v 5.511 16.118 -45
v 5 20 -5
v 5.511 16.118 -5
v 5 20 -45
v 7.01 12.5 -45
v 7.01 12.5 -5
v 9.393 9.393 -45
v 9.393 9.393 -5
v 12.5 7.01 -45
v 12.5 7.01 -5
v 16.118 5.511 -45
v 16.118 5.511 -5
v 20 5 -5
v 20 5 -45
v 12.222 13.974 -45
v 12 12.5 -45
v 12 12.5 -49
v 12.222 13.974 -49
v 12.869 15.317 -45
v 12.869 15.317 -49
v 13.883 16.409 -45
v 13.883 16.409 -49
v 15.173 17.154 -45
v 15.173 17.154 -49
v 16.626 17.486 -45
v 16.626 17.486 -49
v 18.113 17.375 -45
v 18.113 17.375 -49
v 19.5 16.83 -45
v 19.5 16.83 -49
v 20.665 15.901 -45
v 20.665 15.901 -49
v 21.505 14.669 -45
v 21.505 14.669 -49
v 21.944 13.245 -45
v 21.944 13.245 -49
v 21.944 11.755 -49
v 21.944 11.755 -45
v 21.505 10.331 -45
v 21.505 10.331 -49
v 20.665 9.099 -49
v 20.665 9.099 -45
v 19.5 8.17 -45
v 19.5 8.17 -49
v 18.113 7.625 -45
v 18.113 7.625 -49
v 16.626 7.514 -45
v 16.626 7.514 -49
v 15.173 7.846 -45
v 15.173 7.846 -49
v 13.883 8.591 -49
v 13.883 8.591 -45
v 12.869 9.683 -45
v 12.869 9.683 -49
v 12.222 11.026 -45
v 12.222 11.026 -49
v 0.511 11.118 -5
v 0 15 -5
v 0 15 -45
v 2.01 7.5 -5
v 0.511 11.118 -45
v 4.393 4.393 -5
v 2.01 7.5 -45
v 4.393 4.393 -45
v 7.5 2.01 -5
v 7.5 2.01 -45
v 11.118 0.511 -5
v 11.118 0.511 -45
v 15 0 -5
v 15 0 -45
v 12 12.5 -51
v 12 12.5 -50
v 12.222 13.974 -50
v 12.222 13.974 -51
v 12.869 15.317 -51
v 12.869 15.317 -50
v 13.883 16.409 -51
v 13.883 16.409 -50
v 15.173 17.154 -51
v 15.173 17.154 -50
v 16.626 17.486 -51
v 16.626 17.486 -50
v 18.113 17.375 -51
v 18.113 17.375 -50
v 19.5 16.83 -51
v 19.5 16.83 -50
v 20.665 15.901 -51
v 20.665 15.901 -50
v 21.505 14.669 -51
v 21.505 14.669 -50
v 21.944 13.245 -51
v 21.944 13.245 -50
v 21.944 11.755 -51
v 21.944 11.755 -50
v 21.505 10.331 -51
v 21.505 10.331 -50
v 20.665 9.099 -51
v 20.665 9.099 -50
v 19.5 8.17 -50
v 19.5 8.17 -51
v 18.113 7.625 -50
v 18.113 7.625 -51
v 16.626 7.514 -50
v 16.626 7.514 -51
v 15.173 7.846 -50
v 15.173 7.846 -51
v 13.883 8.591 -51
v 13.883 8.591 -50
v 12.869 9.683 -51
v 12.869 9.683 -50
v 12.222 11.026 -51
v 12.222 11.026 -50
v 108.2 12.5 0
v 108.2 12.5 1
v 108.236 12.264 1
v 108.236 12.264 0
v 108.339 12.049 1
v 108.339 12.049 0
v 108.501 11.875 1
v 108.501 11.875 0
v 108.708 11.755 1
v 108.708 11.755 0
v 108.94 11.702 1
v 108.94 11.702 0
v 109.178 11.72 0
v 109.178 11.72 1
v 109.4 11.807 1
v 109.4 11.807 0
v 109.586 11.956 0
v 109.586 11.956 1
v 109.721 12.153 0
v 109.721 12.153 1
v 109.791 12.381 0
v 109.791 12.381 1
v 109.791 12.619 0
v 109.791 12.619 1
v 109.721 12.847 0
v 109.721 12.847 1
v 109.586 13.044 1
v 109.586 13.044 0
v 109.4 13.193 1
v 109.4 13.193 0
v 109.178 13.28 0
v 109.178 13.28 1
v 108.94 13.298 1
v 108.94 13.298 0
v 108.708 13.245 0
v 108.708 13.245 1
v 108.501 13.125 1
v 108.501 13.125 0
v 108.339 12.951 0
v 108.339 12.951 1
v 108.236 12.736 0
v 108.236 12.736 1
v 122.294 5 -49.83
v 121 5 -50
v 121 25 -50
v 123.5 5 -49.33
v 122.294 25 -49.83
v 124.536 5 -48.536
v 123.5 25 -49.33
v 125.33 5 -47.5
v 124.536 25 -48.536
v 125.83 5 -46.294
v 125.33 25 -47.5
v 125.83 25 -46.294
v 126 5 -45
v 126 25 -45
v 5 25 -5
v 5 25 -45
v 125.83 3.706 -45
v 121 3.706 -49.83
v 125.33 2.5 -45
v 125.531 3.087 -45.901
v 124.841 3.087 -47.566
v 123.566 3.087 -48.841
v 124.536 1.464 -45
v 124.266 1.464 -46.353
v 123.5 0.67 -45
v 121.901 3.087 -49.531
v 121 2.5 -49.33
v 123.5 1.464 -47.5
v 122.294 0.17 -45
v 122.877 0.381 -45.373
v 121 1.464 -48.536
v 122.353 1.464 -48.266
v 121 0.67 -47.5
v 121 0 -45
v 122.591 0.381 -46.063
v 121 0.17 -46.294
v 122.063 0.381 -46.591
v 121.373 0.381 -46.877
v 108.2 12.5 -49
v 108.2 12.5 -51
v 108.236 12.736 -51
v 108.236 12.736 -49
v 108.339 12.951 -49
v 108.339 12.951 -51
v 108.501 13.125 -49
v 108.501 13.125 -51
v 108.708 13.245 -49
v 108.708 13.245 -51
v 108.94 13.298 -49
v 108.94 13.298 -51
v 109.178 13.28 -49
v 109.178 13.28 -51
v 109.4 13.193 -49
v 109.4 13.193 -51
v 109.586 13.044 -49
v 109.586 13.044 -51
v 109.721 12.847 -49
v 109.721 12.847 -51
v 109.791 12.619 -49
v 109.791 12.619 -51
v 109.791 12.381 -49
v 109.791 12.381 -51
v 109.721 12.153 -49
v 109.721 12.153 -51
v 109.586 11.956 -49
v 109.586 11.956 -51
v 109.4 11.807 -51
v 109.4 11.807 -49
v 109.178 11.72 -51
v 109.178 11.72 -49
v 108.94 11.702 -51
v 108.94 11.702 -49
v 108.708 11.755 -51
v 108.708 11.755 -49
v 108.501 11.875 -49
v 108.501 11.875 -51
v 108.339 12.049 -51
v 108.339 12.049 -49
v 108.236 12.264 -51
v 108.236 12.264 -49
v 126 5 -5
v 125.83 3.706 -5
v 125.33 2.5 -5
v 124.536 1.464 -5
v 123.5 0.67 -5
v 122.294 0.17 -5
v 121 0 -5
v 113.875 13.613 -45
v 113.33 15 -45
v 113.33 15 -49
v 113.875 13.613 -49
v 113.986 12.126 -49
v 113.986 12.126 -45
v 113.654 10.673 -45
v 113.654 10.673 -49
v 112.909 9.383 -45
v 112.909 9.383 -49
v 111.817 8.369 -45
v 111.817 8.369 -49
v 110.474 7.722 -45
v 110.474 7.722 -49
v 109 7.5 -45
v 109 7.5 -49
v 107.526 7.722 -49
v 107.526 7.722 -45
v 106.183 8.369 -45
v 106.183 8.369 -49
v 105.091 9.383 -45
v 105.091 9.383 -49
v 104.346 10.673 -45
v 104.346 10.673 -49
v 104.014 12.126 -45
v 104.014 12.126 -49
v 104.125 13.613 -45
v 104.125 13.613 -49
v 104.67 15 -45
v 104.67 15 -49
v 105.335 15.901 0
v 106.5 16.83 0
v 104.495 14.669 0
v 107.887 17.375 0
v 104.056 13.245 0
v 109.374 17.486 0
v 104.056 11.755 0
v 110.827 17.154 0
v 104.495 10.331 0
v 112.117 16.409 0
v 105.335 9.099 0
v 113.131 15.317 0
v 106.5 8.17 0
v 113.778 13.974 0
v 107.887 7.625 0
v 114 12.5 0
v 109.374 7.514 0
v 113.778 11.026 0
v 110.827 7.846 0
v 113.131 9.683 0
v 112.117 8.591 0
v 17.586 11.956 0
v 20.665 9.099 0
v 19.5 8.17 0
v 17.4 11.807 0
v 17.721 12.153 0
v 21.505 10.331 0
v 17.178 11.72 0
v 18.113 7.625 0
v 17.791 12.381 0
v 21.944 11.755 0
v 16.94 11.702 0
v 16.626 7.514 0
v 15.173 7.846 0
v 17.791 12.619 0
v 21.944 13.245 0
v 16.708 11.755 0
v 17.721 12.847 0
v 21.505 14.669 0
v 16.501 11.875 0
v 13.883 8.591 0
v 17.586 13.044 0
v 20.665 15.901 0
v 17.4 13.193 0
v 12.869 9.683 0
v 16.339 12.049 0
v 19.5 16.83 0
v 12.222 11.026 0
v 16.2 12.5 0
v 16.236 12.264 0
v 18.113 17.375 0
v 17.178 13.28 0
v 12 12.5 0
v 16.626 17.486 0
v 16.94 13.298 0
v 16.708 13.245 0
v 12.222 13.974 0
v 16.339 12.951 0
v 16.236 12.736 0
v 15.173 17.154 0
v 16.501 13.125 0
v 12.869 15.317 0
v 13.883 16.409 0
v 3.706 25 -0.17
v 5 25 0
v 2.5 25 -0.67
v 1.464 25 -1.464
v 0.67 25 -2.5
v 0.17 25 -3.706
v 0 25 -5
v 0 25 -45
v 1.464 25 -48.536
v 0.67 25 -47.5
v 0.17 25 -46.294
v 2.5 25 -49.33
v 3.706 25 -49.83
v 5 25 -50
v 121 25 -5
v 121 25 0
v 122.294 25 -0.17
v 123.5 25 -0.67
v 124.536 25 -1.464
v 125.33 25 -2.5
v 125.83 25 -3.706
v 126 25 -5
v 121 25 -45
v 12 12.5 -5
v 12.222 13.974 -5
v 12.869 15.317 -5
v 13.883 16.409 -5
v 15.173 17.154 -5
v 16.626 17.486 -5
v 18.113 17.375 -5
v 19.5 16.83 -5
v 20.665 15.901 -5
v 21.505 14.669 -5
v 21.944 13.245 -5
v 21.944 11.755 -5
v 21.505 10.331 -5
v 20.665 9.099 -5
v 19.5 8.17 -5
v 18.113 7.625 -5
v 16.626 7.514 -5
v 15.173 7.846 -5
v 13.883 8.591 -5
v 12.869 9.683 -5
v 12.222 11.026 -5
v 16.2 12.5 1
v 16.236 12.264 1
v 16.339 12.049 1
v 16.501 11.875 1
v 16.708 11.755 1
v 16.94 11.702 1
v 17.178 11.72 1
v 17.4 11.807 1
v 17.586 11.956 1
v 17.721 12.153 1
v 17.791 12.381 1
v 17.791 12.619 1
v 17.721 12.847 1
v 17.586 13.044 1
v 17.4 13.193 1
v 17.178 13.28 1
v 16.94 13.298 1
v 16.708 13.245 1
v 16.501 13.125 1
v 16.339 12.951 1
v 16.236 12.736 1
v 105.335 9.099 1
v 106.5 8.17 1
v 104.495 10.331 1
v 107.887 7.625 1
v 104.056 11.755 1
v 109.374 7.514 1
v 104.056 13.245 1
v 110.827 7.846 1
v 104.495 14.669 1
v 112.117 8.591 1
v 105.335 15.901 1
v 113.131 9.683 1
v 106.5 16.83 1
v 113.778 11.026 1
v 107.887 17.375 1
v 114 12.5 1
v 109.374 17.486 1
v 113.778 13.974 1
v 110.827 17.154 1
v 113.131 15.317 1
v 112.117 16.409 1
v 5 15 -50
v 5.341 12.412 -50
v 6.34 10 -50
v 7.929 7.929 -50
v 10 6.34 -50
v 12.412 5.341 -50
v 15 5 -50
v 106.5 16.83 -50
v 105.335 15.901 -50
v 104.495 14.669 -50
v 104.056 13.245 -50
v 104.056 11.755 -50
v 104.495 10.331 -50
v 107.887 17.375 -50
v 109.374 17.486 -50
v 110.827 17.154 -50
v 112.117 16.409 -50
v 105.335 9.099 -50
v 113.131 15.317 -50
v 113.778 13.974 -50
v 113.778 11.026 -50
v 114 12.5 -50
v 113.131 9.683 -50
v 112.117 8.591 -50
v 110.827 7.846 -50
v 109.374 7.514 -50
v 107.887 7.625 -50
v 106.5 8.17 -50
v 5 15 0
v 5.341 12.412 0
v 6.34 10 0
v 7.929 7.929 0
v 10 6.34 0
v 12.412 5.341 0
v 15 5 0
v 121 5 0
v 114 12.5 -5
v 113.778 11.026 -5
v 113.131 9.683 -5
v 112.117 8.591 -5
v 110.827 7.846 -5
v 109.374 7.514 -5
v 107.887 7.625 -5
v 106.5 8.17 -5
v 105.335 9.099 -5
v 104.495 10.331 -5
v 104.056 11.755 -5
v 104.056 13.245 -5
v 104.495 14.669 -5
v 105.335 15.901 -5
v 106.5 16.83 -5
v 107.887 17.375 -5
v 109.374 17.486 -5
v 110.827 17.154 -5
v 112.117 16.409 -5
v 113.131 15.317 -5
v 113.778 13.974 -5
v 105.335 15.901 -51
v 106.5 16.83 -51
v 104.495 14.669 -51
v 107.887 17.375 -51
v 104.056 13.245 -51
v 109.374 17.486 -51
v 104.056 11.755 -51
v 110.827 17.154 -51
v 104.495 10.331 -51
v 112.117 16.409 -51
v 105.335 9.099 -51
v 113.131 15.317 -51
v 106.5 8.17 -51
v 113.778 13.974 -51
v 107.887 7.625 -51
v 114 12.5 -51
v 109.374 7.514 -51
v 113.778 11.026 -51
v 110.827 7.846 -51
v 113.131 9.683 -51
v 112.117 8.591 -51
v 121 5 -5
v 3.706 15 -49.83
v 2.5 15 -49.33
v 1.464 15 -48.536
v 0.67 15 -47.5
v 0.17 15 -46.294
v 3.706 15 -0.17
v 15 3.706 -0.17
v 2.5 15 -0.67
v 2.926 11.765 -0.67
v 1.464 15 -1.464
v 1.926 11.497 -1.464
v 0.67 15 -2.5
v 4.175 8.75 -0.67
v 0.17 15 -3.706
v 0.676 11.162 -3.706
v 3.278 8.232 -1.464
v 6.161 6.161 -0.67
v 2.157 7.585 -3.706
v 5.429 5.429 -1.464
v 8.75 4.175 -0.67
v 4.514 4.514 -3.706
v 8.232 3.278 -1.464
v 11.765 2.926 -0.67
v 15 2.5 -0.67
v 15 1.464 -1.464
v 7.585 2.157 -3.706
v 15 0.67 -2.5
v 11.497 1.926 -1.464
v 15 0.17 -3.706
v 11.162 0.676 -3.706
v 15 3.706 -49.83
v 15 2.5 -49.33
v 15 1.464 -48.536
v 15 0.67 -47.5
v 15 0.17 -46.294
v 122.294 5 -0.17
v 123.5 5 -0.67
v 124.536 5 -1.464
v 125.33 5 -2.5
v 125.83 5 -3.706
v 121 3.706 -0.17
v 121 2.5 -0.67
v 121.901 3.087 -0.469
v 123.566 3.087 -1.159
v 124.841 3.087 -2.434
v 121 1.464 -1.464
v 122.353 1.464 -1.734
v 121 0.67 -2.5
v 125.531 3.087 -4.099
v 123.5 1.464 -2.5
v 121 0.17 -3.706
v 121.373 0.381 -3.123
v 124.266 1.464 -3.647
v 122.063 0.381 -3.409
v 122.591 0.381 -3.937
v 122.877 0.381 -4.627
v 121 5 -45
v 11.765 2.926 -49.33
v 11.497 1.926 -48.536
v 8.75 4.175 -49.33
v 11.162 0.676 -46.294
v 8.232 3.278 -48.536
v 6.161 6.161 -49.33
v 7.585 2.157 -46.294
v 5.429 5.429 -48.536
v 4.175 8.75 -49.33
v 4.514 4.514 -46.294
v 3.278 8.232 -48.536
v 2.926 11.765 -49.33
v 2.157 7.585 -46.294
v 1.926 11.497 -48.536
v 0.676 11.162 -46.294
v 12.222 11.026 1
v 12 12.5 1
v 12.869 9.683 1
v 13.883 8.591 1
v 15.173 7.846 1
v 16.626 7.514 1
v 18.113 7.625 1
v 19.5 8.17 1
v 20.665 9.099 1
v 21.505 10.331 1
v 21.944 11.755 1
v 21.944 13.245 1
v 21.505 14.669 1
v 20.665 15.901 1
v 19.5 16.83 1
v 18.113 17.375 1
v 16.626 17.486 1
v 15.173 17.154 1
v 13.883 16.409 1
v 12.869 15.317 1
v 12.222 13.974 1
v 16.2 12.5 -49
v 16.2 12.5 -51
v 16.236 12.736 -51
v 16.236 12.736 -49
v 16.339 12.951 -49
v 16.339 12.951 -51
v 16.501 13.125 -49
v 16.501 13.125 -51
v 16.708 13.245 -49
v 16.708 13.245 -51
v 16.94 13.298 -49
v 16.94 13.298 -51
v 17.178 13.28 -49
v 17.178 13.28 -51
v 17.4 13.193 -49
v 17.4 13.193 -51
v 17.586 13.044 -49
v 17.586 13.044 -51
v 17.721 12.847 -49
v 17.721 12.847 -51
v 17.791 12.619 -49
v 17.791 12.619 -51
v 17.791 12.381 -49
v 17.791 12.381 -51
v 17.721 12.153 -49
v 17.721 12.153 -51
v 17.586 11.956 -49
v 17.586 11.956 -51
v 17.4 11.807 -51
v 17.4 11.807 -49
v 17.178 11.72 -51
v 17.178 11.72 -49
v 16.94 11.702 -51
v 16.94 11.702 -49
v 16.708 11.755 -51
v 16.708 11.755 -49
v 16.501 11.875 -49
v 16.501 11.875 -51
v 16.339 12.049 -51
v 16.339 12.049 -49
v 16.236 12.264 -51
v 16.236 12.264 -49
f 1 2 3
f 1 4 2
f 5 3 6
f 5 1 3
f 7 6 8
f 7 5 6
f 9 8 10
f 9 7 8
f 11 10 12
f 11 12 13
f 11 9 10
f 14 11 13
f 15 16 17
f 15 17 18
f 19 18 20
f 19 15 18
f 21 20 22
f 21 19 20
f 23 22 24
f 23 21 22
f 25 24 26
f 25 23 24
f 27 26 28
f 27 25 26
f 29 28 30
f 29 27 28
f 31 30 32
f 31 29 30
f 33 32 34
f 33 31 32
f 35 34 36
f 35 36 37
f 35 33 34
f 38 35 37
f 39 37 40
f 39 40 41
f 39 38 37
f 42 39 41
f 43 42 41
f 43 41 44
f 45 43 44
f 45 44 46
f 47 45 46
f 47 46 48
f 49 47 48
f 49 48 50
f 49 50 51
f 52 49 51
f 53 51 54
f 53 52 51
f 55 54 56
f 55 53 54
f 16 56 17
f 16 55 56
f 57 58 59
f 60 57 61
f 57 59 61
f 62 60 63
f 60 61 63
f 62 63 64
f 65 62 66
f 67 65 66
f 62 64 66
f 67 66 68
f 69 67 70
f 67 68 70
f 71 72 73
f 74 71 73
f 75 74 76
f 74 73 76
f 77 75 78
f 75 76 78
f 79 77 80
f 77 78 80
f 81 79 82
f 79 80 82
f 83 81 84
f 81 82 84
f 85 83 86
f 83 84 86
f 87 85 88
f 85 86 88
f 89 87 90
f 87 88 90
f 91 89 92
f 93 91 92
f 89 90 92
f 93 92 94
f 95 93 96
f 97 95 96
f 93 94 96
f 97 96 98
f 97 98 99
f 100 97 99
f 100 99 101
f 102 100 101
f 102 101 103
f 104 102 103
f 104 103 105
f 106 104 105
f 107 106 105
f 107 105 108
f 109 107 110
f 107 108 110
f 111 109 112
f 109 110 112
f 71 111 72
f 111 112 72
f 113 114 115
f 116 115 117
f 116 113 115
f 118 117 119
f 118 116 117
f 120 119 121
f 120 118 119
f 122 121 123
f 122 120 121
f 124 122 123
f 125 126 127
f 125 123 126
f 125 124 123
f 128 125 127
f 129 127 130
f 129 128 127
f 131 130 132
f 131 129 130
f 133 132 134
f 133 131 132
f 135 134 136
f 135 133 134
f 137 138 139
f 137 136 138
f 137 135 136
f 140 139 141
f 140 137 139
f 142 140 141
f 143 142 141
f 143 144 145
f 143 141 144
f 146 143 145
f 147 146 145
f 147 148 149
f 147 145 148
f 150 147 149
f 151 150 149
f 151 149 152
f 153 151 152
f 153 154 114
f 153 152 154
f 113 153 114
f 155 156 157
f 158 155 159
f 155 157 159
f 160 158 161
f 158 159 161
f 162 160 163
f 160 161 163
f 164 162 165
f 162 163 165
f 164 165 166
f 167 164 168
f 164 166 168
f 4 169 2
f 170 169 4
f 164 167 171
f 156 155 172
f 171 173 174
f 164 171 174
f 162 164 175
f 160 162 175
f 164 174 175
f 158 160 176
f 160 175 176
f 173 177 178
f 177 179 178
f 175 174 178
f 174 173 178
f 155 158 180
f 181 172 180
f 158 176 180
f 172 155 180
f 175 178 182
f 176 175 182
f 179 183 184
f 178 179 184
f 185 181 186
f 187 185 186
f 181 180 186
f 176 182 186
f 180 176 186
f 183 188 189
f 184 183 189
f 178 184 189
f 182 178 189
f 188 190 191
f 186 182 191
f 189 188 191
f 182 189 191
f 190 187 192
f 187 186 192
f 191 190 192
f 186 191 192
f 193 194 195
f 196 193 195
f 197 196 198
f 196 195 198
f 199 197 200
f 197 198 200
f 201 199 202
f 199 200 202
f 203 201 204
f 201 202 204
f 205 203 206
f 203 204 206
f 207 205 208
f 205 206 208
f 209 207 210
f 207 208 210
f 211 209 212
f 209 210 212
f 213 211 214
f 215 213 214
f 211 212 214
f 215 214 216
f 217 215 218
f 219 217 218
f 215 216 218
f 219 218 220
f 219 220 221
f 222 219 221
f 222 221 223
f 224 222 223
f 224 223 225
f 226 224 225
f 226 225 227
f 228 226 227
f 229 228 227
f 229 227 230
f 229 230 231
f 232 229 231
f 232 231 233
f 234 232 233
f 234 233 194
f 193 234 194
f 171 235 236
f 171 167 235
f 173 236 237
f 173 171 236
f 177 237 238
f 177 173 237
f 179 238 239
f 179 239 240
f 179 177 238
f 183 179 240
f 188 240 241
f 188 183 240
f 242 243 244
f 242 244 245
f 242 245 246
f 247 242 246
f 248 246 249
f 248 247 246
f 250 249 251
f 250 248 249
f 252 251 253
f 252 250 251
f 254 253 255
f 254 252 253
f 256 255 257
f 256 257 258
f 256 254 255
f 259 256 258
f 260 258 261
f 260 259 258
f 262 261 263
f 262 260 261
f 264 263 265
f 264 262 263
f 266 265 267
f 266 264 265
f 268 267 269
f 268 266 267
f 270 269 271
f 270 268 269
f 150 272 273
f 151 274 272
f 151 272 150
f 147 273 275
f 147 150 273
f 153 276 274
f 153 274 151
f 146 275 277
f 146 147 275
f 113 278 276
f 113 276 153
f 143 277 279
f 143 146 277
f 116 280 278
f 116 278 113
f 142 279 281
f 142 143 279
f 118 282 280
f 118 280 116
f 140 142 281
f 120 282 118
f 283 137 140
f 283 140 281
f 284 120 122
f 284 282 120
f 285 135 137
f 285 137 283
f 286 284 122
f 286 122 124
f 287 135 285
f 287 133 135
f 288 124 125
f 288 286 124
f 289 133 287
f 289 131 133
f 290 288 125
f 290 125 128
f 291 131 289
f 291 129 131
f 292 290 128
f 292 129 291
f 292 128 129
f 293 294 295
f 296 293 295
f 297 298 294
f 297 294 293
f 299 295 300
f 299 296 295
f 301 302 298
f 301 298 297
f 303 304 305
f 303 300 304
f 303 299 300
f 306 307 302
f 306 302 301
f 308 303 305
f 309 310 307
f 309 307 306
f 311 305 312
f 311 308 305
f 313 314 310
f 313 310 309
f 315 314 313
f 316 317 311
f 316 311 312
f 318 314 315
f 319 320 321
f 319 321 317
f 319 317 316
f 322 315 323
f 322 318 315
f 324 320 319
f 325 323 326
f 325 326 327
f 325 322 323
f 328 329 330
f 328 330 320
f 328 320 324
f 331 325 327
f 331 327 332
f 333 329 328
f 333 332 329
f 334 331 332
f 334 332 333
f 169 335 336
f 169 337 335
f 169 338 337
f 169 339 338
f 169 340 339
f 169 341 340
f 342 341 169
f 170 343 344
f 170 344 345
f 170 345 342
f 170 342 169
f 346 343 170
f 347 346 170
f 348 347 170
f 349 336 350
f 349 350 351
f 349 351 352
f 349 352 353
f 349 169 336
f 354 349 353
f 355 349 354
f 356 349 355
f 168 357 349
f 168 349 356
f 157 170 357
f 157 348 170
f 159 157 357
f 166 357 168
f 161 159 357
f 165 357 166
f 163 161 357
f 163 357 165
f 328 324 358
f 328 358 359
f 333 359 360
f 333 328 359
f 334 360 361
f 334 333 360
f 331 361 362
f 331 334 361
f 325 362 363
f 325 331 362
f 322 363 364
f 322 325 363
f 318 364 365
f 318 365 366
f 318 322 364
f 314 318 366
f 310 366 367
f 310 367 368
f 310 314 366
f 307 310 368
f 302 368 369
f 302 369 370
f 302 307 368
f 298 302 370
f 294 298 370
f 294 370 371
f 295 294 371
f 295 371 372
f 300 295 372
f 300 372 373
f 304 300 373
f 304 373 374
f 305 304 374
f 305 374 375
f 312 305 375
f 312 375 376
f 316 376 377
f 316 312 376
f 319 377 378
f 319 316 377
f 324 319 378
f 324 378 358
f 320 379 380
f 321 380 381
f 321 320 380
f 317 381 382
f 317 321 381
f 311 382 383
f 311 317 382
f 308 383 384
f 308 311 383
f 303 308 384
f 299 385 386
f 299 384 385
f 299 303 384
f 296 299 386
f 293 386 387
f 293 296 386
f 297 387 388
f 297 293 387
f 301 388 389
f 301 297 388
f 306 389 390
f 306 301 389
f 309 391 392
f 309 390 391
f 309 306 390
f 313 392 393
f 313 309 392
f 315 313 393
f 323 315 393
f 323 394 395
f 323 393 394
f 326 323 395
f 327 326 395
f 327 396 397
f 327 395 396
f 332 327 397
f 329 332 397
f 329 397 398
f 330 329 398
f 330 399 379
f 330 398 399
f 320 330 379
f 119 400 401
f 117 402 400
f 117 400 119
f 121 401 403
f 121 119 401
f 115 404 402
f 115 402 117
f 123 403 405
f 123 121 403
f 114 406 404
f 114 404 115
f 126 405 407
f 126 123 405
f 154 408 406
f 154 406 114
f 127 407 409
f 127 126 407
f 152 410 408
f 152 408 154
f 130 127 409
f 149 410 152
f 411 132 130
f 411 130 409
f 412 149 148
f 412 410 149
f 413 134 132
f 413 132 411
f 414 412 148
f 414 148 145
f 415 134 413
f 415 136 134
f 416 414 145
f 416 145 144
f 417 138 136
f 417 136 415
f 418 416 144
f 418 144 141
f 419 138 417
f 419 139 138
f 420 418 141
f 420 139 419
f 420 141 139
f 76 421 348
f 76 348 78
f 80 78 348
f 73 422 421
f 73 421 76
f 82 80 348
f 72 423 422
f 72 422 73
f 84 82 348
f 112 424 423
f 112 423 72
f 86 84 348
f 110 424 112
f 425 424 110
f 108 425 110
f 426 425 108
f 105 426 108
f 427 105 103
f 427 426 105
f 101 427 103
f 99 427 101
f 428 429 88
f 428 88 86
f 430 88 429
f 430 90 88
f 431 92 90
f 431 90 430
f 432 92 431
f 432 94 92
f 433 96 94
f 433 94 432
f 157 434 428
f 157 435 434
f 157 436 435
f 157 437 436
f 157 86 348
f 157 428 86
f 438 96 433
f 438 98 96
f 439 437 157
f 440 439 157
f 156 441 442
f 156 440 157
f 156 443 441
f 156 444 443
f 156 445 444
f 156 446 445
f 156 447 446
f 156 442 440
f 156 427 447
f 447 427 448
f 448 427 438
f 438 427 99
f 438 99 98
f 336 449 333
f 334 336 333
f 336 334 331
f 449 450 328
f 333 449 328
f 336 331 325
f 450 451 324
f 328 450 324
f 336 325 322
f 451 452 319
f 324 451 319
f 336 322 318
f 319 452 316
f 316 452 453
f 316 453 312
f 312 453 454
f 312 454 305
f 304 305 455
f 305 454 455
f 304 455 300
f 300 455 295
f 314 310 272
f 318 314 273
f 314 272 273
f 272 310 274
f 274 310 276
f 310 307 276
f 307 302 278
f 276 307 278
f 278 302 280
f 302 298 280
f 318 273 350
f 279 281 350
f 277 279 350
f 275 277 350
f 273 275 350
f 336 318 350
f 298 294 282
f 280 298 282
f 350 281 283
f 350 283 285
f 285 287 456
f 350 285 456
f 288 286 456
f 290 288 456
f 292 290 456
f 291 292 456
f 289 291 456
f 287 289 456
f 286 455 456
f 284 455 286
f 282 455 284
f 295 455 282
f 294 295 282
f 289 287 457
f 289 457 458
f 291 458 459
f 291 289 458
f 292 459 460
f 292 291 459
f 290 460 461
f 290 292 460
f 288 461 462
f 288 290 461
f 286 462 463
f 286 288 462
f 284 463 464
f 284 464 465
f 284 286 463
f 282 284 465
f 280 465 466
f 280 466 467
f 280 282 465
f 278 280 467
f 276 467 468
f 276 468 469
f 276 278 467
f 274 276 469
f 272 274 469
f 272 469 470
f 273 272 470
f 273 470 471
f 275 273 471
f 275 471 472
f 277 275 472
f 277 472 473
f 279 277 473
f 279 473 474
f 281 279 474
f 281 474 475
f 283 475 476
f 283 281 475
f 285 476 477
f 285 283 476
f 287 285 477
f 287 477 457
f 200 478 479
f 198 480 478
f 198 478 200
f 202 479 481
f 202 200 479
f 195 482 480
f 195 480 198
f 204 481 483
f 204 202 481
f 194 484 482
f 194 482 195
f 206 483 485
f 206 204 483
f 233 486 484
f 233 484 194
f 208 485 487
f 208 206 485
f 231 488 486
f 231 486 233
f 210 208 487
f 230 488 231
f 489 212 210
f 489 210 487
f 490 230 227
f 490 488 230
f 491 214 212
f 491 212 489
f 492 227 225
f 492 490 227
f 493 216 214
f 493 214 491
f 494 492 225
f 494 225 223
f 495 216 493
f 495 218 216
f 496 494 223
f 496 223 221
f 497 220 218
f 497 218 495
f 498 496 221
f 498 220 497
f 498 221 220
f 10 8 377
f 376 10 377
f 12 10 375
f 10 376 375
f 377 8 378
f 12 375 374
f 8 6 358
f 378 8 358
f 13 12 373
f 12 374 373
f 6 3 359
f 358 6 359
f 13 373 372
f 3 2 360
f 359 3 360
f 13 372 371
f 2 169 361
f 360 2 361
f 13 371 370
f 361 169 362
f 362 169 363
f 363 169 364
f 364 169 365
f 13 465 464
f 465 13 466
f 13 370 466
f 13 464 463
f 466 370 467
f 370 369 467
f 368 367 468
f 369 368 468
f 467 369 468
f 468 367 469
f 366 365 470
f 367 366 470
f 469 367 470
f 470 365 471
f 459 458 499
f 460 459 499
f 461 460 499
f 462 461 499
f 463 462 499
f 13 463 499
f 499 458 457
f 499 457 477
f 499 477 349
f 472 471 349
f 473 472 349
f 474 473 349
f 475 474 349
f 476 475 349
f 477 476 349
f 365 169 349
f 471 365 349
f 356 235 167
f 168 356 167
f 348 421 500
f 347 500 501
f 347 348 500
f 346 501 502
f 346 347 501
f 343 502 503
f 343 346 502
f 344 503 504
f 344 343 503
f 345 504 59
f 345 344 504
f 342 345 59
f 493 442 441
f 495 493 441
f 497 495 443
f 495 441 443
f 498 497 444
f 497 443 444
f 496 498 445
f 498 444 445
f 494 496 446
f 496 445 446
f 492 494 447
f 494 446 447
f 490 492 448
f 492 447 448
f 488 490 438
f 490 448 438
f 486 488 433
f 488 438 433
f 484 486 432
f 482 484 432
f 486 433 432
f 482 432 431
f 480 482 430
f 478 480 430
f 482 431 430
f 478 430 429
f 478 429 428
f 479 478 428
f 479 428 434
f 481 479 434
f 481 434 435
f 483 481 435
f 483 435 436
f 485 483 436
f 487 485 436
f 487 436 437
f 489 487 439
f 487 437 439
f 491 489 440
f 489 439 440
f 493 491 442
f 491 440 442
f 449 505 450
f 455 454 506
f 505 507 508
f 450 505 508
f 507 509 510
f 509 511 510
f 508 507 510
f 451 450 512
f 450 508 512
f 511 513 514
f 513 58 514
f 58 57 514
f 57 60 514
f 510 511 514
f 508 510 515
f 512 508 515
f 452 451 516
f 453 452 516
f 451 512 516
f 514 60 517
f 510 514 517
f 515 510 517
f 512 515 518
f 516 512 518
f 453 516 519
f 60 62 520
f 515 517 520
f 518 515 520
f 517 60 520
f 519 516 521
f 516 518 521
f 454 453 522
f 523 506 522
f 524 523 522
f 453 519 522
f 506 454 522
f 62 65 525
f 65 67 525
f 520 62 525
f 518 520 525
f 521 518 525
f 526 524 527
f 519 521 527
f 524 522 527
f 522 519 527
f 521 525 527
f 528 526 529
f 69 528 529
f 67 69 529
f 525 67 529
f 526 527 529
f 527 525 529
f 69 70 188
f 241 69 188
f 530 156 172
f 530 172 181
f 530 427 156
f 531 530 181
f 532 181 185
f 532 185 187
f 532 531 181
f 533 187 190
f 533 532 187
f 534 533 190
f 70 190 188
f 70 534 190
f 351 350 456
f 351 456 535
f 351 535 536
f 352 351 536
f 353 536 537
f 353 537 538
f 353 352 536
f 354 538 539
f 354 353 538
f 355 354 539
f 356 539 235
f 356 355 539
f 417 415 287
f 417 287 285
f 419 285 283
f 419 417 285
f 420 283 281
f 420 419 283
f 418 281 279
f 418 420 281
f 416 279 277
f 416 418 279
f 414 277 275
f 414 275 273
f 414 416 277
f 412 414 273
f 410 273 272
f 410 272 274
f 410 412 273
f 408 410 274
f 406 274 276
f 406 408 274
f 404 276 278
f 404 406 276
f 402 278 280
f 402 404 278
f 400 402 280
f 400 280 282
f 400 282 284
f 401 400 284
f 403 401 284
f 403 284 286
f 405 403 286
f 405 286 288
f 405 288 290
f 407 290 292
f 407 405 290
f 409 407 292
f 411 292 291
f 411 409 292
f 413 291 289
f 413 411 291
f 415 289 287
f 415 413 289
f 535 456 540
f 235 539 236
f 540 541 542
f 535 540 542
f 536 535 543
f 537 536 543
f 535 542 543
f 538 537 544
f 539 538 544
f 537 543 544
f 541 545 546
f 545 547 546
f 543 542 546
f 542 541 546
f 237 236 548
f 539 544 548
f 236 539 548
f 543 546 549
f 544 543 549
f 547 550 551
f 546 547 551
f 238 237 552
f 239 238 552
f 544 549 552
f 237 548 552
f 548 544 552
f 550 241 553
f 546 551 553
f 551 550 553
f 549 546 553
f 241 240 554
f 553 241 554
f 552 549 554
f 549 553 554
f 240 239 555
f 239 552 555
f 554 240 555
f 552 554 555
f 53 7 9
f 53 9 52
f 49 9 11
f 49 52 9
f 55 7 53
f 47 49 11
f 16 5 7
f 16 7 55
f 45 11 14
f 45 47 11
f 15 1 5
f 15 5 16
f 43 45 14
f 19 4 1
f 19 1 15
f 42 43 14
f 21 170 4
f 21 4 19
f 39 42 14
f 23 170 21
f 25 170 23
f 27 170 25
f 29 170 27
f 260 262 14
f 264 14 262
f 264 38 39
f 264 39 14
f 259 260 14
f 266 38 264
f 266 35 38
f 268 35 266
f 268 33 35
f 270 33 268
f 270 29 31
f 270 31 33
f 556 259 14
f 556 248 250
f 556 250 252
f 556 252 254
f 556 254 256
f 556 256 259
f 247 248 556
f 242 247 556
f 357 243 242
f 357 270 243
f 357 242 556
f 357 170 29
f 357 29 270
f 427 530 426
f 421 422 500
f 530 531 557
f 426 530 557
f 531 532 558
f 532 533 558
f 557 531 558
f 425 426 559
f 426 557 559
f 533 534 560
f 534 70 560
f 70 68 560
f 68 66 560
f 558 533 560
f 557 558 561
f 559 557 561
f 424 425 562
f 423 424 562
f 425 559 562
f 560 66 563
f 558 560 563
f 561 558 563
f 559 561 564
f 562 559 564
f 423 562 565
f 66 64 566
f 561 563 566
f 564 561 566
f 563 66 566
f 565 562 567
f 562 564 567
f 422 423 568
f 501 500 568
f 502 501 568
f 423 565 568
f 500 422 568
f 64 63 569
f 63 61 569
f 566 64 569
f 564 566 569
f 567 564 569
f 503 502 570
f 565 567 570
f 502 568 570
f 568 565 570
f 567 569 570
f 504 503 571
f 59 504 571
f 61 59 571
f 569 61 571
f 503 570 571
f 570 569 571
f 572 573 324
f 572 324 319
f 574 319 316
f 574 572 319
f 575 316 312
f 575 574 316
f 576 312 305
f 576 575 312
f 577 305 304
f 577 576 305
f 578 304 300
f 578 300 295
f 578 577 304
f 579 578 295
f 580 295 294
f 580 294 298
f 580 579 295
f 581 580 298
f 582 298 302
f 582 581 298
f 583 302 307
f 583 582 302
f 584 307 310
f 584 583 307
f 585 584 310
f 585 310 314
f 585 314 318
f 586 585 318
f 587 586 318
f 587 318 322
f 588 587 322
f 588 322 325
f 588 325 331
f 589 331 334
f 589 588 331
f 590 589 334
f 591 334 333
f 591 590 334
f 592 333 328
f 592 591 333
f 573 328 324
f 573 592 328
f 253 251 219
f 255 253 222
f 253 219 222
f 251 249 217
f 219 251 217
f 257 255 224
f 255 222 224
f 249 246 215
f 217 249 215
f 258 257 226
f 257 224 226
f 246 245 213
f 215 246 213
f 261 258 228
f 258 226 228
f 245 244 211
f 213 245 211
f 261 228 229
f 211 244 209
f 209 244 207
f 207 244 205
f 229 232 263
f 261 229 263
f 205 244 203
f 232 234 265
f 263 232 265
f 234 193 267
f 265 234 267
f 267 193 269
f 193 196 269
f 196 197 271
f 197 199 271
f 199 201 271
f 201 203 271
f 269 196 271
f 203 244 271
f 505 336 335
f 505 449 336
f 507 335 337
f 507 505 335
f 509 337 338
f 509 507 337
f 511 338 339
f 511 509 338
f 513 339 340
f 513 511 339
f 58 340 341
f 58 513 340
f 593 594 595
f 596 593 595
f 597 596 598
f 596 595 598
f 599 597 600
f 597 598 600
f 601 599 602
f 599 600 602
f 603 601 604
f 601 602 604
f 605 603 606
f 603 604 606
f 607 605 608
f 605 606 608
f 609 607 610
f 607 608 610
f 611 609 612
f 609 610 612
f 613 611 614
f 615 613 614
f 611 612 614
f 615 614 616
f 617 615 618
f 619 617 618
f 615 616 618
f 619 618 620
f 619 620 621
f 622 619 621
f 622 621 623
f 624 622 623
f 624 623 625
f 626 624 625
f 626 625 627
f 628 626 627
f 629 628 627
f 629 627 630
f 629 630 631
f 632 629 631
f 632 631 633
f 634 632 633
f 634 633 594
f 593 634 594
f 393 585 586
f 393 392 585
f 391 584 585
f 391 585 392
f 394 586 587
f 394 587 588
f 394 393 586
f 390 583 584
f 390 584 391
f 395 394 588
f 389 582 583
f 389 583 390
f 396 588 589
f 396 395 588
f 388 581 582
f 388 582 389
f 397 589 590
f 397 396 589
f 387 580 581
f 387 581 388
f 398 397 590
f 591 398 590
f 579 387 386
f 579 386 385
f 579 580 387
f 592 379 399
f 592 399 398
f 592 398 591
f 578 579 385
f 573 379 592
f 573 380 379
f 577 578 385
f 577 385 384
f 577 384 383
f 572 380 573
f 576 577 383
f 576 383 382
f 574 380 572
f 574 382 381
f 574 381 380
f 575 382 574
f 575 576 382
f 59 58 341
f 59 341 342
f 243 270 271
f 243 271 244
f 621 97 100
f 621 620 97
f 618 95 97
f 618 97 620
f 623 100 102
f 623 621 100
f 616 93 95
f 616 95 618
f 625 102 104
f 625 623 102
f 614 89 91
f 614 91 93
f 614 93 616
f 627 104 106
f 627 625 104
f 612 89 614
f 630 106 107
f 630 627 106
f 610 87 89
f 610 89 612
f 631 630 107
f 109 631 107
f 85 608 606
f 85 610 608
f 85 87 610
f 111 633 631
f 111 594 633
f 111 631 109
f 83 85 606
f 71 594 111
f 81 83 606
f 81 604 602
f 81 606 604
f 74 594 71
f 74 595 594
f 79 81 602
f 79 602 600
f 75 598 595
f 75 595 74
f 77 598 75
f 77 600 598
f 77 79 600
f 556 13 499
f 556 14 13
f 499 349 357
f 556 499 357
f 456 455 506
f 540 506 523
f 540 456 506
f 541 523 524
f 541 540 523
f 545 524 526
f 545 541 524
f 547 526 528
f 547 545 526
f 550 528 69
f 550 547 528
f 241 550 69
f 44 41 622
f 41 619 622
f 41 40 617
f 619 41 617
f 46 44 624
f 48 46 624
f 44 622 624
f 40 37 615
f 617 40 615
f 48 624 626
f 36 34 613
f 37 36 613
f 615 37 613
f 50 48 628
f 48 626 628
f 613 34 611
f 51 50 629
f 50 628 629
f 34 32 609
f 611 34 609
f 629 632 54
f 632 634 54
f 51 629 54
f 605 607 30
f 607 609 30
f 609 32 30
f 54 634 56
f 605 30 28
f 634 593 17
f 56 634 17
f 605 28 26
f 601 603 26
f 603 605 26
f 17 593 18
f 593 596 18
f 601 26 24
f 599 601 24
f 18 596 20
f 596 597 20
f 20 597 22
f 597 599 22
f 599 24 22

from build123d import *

# Parameters (mm, degrees)
SKETCH1_W           = 126
SKETCH1_H           = 50
BOSS_EXTRUDE1_DEPTH = 25
SKETCH3_W           = 116
SKETCH3_H           = 40
CUT_EXTRUDE1_DEPTH  = 20
FILLET1_R           = 15
FILLET2_R           = 15
CUT_EXTRUDE2_START  = -5
SKETCH4_R           = 5
CUT_EXTRUDE2_DEPTH  = 4
SKETCH9_R           = 5
BOSS_EXTRUDE5_DEPTH = 1
SKETCH11_R          = 0.8
CUT_EXTRUDE5_DEPTH  = 5
FILLET3_R           = 5
FILLET4_R           = 5
BOSS_EXTRUDE6_START = 1
SKETCH12_R          = 5
BOSS_EXTRUDE6_DEPTH = 1
CUT_EXTRUDE8_START  = -5
SKETCH13_R          = 5
CUT_EXTRUDE8_DEPTH  = 5
SKETCH14_R          = 0.8
CUT_EXTRUDE9_DEPTH  = 5


with BuildPart() as part:
    # Sketch1 → Boss-Extrude1 (new body)
    with BuildSketch(Plane(origin=(0, 0, 0), x_dir=(1, 0, 0), z_dir=(0, 1, 0))):
        with Locations((63, 25)):
            Rectangle(SKETCH1_W, SKETCH1_H)
    extrude(amount=BOSS_EXTRUDE1_DEPTH)

    # Sketch3 → Cut-Extrude1 (cut)
    with BuildSketch(Plane(origin=(0, 25, 0), x_dir=(1, 0, 0), z_dir=(0, 1, 0))):
        with Locations((63, 25)):
            Rectangle(SKETCH3_W, SKETCH3_H)
    extrude(amount=-CUT_EXTRUDE1_DEPTH, mode=Mode.SUBTRACT)

    # Fillet1
    fillet1_edges = [part.edges().sort_by_distance(p)[0] for p in [
        (0, 0, -25),
    ]]
    fillet(fillet1_edges, radius=FILLET1_R)

    # Fillet2
    fillet2_edges = [part.edges().sort_by_distance(p)[0] for p in [
        (5, 5, -25),
    ]]
    fillet(fillet2_edges, radius=FILLET2_R)

    # Sketch4 → Cut-Extrude2 (cut)
    with BuildSketch(Plane(origin=(0, 0, -50), x_dir=(-1, 0, 0), z_dir=(0, 0, -1)).offset(CUT_EXTRUDE2_START)):
        with BuildLine():
            Line((-104.669872981, 15), (-113.330127019, 15))
            ThreePointArc((-113.330127019, 15), (-109, 7.5), (-104.669872981, 15))
        make_face()
        with Locations((-17, 12.5)):
            Circle(SKETCH4_R)
    extrude(amount=CUT_EXTRUDE2_DEPTH, mode=Mode.SUBTRACT)

    # Sketch9 → Boss-Extrude5 (add)
    with BuildSketch(Plane(origin=(0, 0, -50), x_dir=(-1, 0, 0), z_dir=(0, 0, -1))):
        with Locations(Location((-109, 12.5, 0), (0, 0, 180))):
            Circle(SKETCH9_R)
        with Locations((-17, 12.5)):
            Circle(SKETCH9_R)
    extrude(amount=BOSS_EXTRUDE5_DEPTH)

    # Sketch11 → Cut-Extrude5 (cut)
    with BuildSketch(Plane(origin=(0, 0, -51), x_dir=(-1, 0, 0), z_dir=(0, 0, -1))):
        with Locations((-17, 12.5)):
            Circle(SKETCH11_R)
        with Locations((-109, 12.5)):
            Circle(SKETCH11_R)
    extrude(amount=-CUT_EXTRUDE5_DEPTH, mode=Mode.SUBTRACT)

    # Fillet3
    fillet3_edges = [part.edges().sort_by_distance(p)[0] for p in [
        (126, 12.5, -50),
        (126, 12.5, 0),
    ]]
    fillet(fillet3_edges, radius=FILLET3_R)

    # Fillet4
    fillet4_edges = [part.edges().sort_by_distance(p)[0] for p in [
        (68, 0, 0),
        (4.393398282, 4.393398282, 0),
        (4.393398282, 4.393398282, -50),
        (68, 0, -50),
        (126, 0, -25),
        (124.535533906, 0, -1.464466094),
        (124.535533906, 0, -48.535533906),
        (0, 20, -50),
        (0, 20, 0),
    ]]
    fillet(fillet4_edges, radius=FILLET4_R)

    # Sketch12 → Boss-Extrude6 (add)
    with BuildSketch(Plane.XY.offset(BOSS_EXTRUDE6_START)):
        with Locations(Location((17, 12.5, 0), (0, 0, 180))):
            Circle(SKETCH12_R)
        with Locations((109, 12.5)):
            Circle(SKETCH12_R)
    extrude(amount=-BOSS_EXTRUDE6_DEPTH)

    # Sketch13 → Cut-Extrude8 (cut)
    with BuildSketch(Plane(origin=(0, 0, -5), x_dir=(-1, 0, 0), z_dir=(0, 0, -1)).offset(CUT_EXTRUDE8_START)):
        with Locations(Location((-109, 12.5, 0), (0, 0, 180))):
            Circle(SKETCH13_R)
        with Locations((-17, 12.5)):
            Circle(SKETCH13_R)
    extrude(amount=CUT_EXTRUDE8_DEPTH, mode=Mode.SUBTRACT)


with BuildPart() as cut_extrude8_piece_1:
    # of the separate pieces the step leaves, piece 1, a body of its own (cut_extrude8_pieces)
    add(part.part.solids().sort_by_distance((5, 25, 0))[0])


with BuildPart() as cut_extrude8_piece_2:
    # of the separate pieces the step leaves, piece 2, a body of its own (cut_extrude8_pieces)
    add(part.part.solids().sort_by_distance((12, 12.5, 1))[0])


with BuildPart() as cut_extrude8_piece_3:
    # of the separate pieces the step leaves, piece 3, a body of its own (cut_extrude8_pieces)
    add(part.part.solids().sort_by_distance((114, 12.5, 1))[0])


with BuildPart() as cut_extrude9_tool:
    # Sketch14 → Cut-Extrude9 (new body)
    with BuildSketch(Plane.XY):
        with Locations(Location((17, 12.5, 0), (0, 0, 180))):
            Circle(SKETCH14_R)
        with Locations(Location((109, 12.5, 0), (0, 0, 180))):
            Circle(SKETCH14_R)
    extrude(amount=CUT_EXTRUDE9_DEPTH)


with BuildPart() as cut_extrude8_piece_2_1:
    add(cut_extrude8_piece_2.part)

    # Cut-Extrude9: cut by cut_extrude9_tool
    add(cut_extrude9_tool.part, mode=Mode.SUBTRACT)


with BuildPart() as cut_extrude8_piece_3_1:
    add(cut_extrude8_piece_3.part)

    # Cut-Extrude9: cut by cut_extrude9_tool
    add(cut_extrude9_tool.part, mode=Mode.SUBTRACT)


solid = Compound([cut_extrude8_piece_1.part, cut_extrude8_piece_2_1.part, cut_extrude8_piece_3_1.part])
